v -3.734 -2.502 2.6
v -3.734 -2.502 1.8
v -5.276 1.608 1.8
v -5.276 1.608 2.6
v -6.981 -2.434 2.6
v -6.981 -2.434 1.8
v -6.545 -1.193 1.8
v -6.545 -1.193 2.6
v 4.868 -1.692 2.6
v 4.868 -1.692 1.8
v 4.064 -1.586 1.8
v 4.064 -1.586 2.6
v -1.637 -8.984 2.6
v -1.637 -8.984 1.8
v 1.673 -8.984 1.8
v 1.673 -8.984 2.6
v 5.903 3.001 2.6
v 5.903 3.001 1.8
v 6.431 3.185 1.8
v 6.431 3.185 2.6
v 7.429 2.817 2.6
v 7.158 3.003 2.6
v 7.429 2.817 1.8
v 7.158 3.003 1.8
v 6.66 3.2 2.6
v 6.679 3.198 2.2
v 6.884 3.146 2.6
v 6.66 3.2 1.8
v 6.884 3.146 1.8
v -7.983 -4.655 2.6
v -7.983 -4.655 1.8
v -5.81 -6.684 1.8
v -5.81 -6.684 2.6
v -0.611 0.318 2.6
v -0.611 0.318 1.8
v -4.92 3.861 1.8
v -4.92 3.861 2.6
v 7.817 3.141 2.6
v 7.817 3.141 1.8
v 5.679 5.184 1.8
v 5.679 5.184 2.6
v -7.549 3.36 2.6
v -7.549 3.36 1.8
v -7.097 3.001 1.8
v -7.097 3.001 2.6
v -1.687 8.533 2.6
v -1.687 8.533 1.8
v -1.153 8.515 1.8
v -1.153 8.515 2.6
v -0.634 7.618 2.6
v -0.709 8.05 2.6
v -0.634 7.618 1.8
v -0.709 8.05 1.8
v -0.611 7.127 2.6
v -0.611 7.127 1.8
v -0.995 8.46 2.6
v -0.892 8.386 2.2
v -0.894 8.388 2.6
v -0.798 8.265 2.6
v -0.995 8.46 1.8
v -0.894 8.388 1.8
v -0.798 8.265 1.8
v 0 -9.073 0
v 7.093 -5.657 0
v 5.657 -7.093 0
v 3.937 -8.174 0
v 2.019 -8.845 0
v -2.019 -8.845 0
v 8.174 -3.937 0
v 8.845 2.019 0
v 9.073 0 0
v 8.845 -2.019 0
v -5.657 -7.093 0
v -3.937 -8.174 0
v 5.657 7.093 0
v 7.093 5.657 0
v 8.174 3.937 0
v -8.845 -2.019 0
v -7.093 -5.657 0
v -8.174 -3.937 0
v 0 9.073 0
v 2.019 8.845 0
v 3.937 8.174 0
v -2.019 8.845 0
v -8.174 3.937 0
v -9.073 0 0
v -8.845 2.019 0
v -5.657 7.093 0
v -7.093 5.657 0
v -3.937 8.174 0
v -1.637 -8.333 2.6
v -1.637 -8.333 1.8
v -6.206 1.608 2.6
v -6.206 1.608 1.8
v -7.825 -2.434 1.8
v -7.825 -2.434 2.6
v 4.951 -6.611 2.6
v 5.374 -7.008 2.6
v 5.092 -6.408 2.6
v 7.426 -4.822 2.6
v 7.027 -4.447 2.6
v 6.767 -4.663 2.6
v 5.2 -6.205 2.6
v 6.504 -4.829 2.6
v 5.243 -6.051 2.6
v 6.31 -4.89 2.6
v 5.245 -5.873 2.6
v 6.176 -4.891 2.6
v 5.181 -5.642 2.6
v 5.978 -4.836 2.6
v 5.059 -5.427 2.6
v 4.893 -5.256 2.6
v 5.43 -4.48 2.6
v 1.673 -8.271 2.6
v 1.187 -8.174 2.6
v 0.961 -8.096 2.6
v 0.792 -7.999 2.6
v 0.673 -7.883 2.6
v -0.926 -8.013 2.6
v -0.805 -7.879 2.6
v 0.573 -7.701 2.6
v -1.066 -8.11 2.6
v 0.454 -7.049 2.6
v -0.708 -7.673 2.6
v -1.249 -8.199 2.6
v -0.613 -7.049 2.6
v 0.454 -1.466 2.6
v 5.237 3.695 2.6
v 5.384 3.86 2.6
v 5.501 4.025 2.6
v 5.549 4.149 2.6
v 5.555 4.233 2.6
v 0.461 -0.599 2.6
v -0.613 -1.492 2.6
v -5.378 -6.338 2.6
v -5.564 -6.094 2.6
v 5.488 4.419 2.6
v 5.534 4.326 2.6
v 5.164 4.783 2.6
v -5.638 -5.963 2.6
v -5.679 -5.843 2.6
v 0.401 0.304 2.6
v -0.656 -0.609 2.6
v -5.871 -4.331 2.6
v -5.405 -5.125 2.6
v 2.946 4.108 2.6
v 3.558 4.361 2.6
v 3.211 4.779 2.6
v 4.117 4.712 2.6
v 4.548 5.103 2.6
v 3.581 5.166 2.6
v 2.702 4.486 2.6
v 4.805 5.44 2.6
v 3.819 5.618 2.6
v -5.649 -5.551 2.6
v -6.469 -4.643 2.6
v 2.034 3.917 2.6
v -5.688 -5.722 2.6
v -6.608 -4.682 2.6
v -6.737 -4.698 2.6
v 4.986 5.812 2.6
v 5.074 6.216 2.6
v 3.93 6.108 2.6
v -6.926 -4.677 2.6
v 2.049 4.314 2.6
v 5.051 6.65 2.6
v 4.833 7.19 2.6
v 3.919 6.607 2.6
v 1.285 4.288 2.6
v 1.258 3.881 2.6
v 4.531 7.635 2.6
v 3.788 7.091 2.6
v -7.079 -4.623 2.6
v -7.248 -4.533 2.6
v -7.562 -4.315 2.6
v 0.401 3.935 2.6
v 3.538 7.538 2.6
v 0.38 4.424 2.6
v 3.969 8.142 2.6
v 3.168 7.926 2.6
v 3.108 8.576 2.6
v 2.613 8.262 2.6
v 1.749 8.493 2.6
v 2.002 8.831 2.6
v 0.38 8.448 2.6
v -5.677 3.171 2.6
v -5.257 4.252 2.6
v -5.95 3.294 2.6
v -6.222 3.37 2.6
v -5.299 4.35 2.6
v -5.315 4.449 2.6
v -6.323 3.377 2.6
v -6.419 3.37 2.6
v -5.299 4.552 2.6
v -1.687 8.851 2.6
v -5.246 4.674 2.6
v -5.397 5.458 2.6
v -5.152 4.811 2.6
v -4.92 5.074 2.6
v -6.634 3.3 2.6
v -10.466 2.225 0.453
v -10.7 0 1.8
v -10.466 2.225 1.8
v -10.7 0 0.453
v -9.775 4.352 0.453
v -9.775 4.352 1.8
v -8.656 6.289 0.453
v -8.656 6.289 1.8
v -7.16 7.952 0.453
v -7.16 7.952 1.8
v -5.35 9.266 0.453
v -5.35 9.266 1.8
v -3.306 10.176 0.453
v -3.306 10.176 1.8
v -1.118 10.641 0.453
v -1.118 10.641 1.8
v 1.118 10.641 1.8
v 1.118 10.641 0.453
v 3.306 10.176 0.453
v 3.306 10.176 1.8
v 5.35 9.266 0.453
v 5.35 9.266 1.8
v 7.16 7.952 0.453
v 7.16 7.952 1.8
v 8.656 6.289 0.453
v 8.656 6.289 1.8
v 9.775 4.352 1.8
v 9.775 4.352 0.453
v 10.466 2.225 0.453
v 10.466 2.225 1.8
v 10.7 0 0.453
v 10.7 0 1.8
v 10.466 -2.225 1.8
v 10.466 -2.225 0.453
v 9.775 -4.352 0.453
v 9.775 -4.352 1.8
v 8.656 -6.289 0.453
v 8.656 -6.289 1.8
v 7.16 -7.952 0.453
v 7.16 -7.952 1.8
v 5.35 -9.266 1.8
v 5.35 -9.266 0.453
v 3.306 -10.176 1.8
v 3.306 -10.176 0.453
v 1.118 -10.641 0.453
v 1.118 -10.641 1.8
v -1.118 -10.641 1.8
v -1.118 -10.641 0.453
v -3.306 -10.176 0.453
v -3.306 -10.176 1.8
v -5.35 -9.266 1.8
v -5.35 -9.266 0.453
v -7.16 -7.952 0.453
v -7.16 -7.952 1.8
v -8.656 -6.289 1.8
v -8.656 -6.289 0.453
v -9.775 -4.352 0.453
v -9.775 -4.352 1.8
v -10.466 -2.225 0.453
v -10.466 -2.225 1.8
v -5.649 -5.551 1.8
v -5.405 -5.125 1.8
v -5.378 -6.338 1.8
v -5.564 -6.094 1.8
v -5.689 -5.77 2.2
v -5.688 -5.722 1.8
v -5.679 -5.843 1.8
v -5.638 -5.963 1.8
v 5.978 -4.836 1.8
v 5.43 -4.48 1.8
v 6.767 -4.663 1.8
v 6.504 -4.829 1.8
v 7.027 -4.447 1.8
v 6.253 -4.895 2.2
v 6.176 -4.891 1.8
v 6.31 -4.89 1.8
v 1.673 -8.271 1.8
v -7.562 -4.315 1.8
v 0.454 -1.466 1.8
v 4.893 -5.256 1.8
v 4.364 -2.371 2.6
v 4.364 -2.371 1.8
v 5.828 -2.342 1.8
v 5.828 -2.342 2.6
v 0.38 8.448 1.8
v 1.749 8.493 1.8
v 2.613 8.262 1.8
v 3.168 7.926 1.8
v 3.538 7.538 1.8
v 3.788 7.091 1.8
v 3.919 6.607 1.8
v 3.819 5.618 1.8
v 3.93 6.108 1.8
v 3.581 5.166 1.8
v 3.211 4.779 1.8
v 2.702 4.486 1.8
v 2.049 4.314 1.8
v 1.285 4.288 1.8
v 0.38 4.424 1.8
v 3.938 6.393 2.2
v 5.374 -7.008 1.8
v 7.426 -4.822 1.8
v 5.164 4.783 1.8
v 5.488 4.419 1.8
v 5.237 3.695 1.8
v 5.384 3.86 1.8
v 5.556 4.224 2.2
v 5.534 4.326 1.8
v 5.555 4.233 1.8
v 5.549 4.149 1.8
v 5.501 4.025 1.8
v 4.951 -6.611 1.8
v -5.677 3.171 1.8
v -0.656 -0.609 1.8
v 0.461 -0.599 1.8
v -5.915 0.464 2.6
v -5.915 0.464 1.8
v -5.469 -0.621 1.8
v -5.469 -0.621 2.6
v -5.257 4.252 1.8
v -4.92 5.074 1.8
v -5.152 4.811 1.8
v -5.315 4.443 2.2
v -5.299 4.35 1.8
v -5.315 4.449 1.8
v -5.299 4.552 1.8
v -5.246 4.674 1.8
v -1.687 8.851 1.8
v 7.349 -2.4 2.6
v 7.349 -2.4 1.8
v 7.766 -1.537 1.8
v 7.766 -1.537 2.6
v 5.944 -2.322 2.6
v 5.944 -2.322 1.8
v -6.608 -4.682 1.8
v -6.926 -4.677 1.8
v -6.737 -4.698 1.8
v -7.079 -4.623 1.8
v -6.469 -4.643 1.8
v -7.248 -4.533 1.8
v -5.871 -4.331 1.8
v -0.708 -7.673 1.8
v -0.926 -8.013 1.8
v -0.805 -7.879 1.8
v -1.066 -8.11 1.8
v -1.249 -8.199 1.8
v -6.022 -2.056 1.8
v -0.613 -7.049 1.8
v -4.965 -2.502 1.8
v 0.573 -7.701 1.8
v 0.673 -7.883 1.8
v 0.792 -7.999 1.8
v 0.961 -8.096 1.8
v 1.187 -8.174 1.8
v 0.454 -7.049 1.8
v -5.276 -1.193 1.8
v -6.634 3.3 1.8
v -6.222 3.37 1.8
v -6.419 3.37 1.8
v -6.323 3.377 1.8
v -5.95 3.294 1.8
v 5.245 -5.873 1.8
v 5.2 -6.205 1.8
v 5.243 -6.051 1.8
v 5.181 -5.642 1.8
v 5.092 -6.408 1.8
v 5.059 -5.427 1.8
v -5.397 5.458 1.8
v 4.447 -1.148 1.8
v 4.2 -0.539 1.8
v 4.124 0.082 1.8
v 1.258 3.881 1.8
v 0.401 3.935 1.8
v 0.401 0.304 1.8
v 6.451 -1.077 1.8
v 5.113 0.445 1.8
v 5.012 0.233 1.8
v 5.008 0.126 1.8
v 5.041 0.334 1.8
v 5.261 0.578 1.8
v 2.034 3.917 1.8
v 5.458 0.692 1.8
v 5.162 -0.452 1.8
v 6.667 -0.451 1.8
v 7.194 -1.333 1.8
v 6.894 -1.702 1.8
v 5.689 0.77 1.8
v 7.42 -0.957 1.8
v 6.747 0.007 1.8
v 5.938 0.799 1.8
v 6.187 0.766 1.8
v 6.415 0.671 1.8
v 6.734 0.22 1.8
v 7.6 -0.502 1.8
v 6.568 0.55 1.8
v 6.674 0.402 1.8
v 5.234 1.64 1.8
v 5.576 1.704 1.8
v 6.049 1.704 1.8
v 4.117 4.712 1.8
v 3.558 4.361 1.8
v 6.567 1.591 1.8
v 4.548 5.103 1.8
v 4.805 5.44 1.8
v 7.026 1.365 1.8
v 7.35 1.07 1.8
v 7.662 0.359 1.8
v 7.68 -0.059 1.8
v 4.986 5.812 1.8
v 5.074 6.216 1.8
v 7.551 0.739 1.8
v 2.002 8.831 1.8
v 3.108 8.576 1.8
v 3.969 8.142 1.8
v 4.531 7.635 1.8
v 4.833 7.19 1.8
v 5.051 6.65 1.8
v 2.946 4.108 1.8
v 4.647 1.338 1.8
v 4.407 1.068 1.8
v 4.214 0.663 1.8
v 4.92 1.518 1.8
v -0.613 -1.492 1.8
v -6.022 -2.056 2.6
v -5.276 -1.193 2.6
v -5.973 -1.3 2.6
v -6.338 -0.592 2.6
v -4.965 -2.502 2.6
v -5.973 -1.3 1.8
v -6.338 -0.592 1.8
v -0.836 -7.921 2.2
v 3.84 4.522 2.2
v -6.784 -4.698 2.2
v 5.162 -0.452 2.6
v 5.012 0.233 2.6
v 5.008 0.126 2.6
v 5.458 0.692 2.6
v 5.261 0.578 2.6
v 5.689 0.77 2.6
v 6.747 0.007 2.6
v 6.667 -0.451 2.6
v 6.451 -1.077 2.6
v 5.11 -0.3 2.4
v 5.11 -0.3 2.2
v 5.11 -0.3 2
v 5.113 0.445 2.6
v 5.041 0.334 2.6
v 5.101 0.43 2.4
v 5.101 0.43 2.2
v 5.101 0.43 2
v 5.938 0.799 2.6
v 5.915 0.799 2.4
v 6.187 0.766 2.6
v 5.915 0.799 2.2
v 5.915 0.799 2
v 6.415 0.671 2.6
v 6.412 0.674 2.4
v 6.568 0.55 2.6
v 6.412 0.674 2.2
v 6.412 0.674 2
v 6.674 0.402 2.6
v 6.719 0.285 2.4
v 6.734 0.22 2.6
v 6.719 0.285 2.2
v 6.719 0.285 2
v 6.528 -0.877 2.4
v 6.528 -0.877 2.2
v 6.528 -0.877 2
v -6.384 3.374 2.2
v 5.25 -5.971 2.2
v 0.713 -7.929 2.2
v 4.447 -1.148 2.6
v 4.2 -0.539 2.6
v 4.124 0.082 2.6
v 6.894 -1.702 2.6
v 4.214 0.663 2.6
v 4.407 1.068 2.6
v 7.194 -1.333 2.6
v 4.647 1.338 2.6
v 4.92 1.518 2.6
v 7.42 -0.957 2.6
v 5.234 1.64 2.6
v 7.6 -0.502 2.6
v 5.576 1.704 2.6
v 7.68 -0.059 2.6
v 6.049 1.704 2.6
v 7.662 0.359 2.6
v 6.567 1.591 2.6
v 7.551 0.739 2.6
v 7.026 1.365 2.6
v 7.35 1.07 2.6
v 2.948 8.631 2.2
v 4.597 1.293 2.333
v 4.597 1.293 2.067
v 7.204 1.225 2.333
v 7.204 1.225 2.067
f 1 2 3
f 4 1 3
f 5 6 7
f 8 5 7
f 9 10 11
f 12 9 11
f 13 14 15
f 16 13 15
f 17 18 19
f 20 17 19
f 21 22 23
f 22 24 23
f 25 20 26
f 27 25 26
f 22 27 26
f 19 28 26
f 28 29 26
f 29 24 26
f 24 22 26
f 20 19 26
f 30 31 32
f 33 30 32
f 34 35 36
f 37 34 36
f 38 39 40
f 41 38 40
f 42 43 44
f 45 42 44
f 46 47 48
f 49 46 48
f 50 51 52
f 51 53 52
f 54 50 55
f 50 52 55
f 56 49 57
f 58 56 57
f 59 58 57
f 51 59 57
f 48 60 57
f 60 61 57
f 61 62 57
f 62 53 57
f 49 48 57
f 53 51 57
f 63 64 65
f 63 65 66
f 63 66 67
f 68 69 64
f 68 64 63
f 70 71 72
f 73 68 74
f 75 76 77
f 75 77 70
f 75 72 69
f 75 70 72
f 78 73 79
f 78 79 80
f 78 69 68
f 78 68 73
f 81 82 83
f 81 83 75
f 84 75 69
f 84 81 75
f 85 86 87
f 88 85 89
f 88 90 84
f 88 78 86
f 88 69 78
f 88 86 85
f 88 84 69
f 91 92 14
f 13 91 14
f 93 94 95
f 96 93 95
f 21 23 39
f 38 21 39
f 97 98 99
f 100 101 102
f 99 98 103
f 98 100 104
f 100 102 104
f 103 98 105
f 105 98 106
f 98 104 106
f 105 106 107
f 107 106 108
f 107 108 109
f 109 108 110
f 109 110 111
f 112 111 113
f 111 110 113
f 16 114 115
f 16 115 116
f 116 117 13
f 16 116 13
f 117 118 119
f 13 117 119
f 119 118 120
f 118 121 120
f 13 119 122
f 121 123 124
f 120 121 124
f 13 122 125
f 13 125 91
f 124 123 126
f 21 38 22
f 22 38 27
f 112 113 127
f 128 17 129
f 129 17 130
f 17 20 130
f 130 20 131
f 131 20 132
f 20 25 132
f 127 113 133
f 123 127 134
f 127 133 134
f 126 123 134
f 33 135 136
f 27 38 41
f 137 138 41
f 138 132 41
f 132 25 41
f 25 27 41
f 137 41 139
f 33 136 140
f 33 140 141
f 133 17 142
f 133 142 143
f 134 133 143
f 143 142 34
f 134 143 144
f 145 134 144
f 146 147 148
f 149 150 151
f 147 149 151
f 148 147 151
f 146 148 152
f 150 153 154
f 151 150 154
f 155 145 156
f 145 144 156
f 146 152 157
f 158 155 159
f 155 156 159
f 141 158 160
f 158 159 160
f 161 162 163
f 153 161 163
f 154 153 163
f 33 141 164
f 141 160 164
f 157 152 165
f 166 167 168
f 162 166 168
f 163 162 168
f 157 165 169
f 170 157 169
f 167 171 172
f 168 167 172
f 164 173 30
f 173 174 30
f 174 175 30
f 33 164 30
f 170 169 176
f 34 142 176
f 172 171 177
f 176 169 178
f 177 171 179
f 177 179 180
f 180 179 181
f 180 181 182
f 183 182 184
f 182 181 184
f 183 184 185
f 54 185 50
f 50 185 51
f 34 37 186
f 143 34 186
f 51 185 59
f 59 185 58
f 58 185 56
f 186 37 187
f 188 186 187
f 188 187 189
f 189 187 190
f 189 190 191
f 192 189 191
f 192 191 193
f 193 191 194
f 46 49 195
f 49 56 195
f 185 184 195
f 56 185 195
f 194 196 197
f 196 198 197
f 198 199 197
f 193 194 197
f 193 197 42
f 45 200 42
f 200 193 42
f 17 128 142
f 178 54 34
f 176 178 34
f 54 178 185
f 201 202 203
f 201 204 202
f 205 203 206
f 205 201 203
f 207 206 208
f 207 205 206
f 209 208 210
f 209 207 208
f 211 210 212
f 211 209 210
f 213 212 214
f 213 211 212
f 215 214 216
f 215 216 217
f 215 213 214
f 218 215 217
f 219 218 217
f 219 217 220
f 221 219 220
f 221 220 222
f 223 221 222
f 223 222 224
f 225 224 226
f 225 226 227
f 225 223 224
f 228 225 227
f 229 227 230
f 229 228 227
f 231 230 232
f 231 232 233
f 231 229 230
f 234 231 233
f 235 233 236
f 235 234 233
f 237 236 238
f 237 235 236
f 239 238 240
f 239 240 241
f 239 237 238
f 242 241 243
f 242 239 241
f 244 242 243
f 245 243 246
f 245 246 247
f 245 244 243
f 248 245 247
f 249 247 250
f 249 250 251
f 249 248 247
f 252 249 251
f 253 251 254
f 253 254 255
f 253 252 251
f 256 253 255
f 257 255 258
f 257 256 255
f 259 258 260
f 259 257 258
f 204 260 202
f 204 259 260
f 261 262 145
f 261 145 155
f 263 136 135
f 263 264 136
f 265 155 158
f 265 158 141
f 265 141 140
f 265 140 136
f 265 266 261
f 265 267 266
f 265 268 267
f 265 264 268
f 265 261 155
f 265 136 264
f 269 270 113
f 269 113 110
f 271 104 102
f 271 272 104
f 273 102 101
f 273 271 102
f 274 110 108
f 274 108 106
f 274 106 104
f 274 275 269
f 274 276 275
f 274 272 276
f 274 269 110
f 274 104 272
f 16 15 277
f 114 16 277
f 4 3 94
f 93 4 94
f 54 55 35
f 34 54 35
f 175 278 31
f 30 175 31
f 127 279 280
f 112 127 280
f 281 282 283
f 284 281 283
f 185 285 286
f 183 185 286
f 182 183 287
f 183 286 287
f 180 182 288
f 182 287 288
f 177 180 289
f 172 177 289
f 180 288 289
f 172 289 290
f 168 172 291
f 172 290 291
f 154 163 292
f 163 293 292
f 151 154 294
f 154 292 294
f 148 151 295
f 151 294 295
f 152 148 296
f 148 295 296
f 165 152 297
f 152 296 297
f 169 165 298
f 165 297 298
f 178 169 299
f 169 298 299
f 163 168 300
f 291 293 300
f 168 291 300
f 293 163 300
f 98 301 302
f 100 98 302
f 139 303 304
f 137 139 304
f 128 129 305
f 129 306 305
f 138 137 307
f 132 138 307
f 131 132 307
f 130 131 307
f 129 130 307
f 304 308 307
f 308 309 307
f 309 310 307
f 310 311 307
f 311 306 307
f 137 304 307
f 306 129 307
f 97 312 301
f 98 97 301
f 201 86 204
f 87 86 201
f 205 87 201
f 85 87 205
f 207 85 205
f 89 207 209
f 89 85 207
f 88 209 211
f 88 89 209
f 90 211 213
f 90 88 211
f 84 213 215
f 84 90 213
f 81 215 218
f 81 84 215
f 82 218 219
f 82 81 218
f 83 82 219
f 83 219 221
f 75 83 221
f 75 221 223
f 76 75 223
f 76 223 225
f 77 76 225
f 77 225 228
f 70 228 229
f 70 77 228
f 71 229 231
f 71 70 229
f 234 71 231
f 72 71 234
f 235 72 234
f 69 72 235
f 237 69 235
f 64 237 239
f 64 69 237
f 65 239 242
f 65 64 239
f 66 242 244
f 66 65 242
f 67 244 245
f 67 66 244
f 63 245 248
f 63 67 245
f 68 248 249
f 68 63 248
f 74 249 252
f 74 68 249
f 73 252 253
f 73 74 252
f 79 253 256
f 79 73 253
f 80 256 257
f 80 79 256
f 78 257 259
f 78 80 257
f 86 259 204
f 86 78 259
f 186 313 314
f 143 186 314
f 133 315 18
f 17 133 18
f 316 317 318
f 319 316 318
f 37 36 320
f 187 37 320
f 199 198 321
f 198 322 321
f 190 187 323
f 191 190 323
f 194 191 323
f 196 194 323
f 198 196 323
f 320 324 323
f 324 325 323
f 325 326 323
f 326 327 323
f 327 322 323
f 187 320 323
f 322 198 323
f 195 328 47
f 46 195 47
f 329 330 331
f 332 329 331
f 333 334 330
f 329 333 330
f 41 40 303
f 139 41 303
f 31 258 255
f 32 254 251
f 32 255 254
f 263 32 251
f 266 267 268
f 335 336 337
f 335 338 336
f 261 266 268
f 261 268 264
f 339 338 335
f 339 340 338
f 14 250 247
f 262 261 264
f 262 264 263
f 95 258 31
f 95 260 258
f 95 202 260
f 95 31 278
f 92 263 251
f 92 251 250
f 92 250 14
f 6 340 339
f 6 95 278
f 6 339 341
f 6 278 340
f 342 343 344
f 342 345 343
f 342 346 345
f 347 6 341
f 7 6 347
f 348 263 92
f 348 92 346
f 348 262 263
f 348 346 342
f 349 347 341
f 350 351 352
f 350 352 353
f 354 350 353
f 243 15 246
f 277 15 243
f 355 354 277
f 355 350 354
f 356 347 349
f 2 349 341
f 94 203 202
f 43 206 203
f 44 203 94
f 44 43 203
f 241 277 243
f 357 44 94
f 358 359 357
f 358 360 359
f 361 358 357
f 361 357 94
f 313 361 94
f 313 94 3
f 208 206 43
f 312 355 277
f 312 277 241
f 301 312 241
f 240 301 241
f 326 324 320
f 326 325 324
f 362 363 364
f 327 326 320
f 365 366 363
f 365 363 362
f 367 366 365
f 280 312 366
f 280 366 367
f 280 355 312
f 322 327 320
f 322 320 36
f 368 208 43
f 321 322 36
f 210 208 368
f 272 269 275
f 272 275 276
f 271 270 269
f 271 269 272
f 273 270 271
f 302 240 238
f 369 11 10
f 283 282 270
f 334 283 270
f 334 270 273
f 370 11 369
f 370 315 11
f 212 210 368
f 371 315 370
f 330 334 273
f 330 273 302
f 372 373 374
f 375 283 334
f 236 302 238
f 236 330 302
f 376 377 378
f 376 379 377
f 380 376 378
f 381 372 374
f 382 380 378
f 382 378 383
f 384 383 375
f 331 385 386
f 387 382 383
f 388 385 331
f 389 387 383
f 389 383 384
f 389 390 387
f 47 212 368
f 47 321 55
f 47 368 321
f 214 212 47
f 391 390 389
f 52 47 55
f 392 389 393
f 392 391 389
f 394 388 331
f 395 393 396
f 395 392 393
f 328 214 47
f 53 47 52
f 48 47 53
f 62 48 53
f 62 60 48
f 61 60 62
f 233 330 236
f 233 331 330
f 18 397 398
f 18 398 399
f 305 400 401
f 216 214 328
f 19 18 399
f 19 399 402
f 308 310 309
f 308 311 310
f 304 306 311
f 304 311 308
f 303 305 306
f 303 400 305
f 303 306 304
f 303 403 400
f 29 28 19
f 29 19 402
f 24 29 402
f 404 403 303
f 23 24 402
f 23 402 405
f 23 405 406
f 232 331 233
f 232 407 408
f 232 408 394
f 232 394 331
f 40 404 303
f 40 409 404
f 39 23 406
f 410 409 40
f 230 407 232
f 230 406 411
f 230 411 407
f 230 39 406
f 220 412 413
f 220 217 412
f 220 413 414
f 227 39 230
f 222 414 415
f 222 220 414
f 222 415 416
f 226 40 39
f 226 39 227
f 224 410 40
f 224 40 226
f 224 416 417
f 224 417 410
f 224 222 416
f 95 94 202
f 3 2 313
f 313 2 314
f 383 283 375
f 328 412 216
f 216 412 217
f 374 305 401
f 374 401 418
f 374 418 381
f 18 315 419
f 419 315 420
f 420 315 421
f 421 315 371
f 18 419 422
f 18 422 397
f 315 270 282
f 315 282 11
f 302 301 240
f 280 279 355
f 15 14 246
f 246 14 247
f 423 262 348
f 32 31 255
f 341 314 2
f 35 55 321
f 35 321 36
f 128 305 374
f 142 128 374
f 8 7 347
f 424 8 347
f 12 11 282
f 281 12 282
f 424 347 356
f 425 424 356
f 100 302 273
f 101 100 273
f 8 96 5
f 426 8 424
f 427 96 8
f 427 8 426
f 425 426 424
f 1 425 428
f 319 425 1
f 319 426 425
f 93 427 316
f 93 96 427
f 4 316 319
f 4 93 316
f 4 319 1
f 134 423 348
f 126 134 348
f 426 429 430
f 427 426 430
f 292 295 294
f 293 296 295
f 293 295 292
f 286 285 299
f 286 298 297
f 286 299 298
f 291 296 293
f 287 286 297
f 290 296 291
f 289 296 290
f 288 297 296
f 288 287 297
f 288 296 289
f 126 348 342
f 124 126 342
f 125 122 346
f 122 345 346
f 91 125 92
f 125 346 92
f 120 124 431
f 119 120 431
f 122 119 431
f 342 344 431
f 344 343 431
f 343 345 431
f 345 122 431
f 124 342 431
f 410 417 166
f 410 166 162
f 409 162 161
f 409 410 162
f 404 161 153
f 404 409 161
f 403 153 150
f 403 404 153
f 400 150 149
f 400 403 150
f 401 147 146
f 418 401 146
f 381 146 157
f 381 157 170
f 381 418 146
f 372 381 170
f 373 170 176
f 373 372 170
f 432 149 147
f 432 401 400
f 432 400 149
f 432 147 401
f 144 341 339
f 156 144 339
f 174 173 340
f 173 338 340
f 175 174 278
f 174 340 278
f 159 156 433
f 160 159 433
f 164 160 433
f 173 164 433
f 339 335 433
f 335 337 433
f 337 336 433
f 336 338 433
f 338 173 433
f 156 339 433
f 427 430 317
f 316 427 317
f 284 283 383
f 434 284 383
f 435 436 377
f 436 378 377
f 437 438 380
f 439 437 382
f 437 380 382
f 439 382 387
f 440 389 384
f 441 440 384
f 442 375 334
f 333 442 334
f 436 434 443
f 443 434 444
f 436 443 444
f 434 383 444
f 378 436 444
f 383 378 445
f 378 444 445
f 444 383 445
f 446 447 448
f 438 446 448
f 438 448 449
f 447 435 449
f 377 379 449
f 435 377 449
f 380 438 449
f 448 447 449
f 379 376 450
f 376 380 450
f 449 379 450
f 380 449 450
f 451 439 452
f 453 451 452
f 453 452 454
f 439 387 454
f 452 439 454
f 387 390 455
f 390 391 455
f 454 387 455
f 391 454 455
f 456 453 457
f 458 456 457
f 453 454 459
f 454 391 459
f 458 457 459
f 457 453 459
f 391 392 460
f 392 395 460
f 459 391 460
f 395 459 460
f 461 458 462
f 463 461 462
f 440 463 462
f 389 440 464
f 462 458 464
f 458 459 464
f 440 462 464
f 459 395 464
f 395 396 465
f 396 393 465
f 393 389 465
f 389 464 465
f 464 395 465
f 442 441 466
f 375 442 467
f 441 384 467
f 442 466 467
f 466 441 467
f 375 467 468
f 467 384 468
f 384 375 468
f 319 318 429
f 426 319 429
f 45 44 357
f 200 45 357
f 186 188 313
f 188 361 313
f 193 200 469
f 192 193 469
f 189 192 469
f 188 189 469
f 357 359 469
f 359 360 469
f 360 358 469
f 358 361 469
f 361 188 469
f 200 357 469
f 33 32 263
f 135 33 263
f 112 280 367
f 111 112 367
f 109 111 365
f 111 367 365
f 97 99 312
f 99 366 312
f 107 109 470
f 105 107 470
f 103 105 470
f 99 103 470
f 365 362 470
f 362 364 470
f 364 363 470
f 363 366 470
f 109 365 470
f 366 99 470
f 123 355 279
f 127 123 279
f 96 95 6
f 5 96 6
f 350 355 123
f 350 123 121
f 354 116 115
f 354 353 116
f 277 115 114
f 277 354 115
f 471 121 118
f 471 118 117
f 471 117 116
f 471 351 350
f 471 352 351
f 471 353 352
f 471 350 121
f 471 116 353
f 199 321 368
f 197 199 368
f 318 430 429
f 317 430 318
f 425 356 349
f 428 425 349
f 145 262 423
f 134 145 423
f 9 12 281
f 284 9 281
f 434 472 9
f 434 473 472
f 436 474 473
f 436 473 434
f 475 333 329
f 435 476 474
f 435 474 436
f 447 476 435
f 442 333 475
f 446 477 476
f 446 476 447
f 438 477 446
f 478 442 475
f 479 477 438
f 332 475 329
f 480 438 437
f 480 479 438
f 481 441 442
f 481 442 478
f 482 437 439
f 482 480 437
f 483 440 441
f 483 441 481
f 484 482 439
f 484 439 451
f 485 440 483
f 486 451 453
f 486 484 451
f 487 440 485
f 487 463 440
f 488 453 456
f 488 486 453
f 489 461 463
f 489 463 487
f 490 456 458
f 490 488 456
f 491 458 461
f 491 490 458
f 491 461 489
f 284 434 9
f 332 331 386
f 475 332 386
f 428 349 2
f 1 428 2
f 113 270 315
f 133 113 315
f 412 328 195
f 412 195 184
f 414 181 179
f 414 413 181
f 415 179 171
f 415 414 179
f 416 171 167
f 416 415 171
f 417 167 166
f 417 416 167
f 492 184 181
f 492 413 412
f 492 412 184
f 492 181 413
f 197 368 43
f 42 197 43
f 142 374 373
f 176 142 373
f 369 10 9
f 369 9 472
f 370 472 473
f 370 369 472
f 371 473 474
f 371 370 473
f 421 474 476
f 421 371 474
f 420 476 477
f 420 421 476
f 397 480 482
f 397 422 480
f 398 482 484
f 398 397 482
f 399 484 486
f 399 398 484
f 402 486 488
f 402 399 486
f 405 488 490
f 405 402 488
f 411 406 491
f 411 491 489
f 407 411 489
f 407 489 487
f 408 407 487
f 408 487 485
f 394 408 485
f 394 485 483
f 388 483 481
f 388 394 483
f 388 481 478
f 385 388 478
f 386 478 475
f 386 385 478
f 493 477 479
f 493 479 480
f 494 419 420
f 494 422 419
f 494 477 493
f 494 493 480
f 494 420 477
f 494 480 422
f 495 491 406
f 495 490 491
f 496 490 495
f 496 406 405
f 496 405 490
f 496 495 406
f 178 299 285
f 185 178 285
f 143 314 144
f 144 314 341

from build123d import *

# Parameters (mm, degrees)
F3_DEPTH = 0.8


with BuildPart() as f1:
    # F0 (on Front) → F1 (revolve)
    with BuildSketch(Plane.XZ):
        Polygon((0, 1.8), (-10.7, 1.8), (-10.7, 0.4530665231), (-9.0727129846, 0), (0, 0), align=None)
    revolve(axis=Axis((0, 0, 1.1966938619), (0, 0, -1)))

    # F2 (on face) → F3 (join)
    with BuildSketch(Plane.XY.offset(1.8)):
        with BuildLine():
            add(Edge.make_bspline(
                [(-1.6867941013, 8.8509330526), (0.8566841716, 8.8753895834), (2.649315499, 9.0611870259), (4.7208145261, 7.7993022278), (5.050977692, 6.6498457454)],
                knots=[0, 0, 0, 0, 0.5589307471, 1, 1, 1, 1], degree=3))
            Line((-1.6867941013, 8.8509330526), (-1.6867941013, 8.5329981521))
            add(Edge.make_bspline(
                [(-1.6867941013, 8.5329981521), (-1.3774677293, 8.5470557254), (-0.6938875858, 8.5771007031), (-0.6173685214, 7.6472761807), (-0.6112642586, 7.1267476305)],
                knots=[0, 0, 0, 0, 0.441787592, 1, 1, 1, 1], degree=3))
            Line((-0.6112642586, 7.1267476305), (-0.6112642586, 0.3177910403))
            Line((-0.6112642586, 0.3177910403), (-4.9199624918, 3.8612245116))
            add(Edge.make_bspline(
                [(-4.9199624918, 3.8612245116), (-5.1154879855, 4.0527227146), (-5.5120993261, 4.4411649455), (-5.1191776451, 4.8610289061), (-4.9199624918, 5.0739040598)],
                knots=[0, 0, 0, 0, 0.4929901738, 1, 1, 1, 1], degree=3))
            Line((-4.9199624918, 5.0739040598), (-5.3968969733, 5.457715597))
            Line((-5.3968969733, 5.457715597), (-7.5489841402, 3.3604586497))
            Line((-7.5489841402, 3.3604586497), (-7.0966347121, 3.000701312))
            add(Edge.make_bspline(
                [(-7.0966347121, 3.000701312), (-6.8613198471, 3.1750743352), (-6.4010215426, 3.5161645889), (-5.9145178984, 3.2846312905), (-5.6767258793, 3.1714630313)],
                knots=[0, 0, 0, 0, 0.5112225325, 1, 1, 1, 1], degree=3))
            Line((-5.6767258793, 3.1714630313), (-0.6559019093, -0.6086938665))
            Line((-0.6559019093, -0.6086938665), (-5.8705802076, -4.3306946754))
            add(Edge.make_bspline(
                [(-5.8705802076, -4.3306946754), (-6.1822484494, -4.5196679636), (-6.7864429099, -4.8860081888), (-7.308925656, -4.5013103723), (-7.5618904084, -4.3150554411)],
                knots=[0, 0, 0, 0, 0.5158409455, 1, 1, 1, 1], degree=3))
            Line((-7.5618904084, -4.3150554411), (-7.9826125875, -4.6550915577))
            Line((-7.9826125875, -4.6550915577), (-5.8098412119, -6.6837798804))
            Line((-5.8098412119, -6.6837798804), (-5.3775920533, -6.3379807398))
            add(Edge.make_bspline(
                [(-5.4053300992, -5.1254965365), (-5.5515290524, -5.3446676224), (-5.8379925252, -5.7741133125), (-5.5289246402, -6.1526388002), (-5.3775920533, -6.3379807398)],
                knots=[0, 0, 0, 0, 0.5103580985, 1, 1, 1, 1], degree=3))
            Line((-5.4053300992, -5.1254965365), (-0.6126278895, -1.4923192712))
            Line((-0.6126278895, -1.4923192712), (-0.6126278895, -7.048912812))
            add(Edge.make_bspline(
                [(-0.6126278895, -7.048912812), (-0.6389726569, -7.377813444), (-0.6916788554, -8.0358227462), (-1.3219282839, -8.234017122), (-1.637152629, -8.3331456408)],
                knots=[0, 0, 0, 0, 0.4998419184, 1, 1, 1, 1], degree=3))
            Line((-1.637152629, -8.3331456408), (-1.637152629, -8.9842546731))
            Line((-1.637152629, -8.9842546731), (1.6732236836, -8.9842546731))
            Line((1.6732236836, -8.9842546731), (1.6732236836, -8.2714613527))
            add(Edge.make_bspline(
                [(0.4535702465, -7.048912812), (0.4870410433, -7.3872676951), (0.5558033707, -8.0823831835), (1.2942327078, -8.2073324667), (1.6732236836, -8.2714613527)],
                knots=[0, 0, 0, 0, 0.4867606733, 1, 1, 1, 1], degree=3))
            Line((0.4535702465, -7.048912812), (0.4535702465, -1.4659117442))
            Line((0.4535702465, -1.4659117442), (4.8928316683, -5.2557615563))
            add(Edge.make_bspline(
                [(4.8928316683, -5.2557615563), (5.103411153, -5.4165492766), (5.3978362889, -6.0029897915), (5.1020476496, -6.4001318691), (4.9510909234, -6.6109133504)],
                knots=[0, 0, 0, 0, 0.5154207237, 1, 1, 1, 1], degree=3))
            Line((4.9510909234, -6.6109133504), (5.3739010935, -7.0078365295))
            Line((5.3739010935, -7.0078365295), (7.4263224378, -4.8215580173))
            Line((7.4263224378, -4.8215580173), (7.0269443095, -4.4466322288))
            add(Edge.make_bspline(
                [(5.4299915209, -4.4800881296), (5.7073067114, -4.6913712485), (6.2579025081, -5.1108635847), (6.7718523941, -4.6669584172), (7.0269443095, -4.4466322288)],
                knots=[0, 0, 0, 0, 0.5036638351, 1, 1, 1, 1], degree=3))
            Line((5.4299915209, -4.4800881296), (0.4608821182, -0.5992884981))
            Line((0.4608821182, -0.5992884981), (5.9025837108, 3.000701312))
            add(Edge.make_bspline(
                [(5.9025837108, 3.000701312), (6.1652393352, 3.1131659914), (6.6968427958, 3.3407895685), (7.1827875665, 2.993159634), (7.4286358431, 2.8172873426)],
                knots=[0, 0, 0, 0, 0.4940818558, 1, 1, 1, 1], degree=3))
            Line((7.4286358431, 2.8172873426), (7.8171929345, 3.1411375385))
            Line((7.8171929345, 3.1411375385), (5.6788134389, 5.183564499))
            Line((5.6788134389, 5.183564499), (5.1636509597, 4.7825793736))
            add(Edge.make_bspline(
                [(5.1636509597, 4.7825793736), (5.3563745653, 4.5959784132), (5.7323232052, 4.2319733033), (5.3994815796, 3.8708627719), (5.23726549, 3.6948693451)],
                knots=[0, 0, 0, 0, 0.5126328046, 1, 1, 1, 1], degree=3))
            Line((5.23726549, 3.6948693451), (0.4013032594, 0.3040304291))
            Line((0.4013032594, 0.3040304291), (0.4013032594, 3.9351717569))
            add(Edge.make_bspline(
                [(5.050977692, 6.6498457454), (5.2227766775, 5.7417653934), (3.8530424976, 4.1063453678), (1.8400062355, 3.7766705272), (0.4013032594, 3.9351717569)],
                knots=[0, 0, 0, 0, 0.4558296962, 1, 1, 1, 1], degree=3))
        make_face()
        with BuildLine():
            Line((0.3797819663, 4.424153241), (0.3797819663, 8.4475489607))
            add(Edge.make_bspline(
                [(0.3797819663, 8.4475489607), (2.7214622988, 8.8398724894), (5.0507446574, 6.4596899692), (2.9288335052, 3.8387254341), (0.3797819663, 4.424153241)],
                knots=[0, 0, 0, 0, 0.5012880833, 1, 1, 1, 1], degree=3))
        make_face(mode=Mode.SUBTRACT)
        Polygon((-6.2060756609, 1.6079591587), (-7.8247580677, -2.4339009542), (-6.9814925082, -2.4339009542), (-6.5453206189, -1.1932341149), (-6.0219140723, -2.0558852702), (-5.2755754441, -1.1932341149), (-4.9654087052, -2.5017498992), (-3.7344344892, -2.5017498992), (-5.2755754441, 1.6079591587), align=None)
        Polygon((-6.3382112782, -0.5918067245), (-5.9152944013, 0.4642193671), (-5.4694297723, -0.6213641609), (-5.9734508395, -1.2998539023), align=None, mode=Mode.SUBTRACT)
        with BuildLine():
            Line((4.3641445227, -2.3708629888), (5.8277440257, -2.3417847697))
            add(Edge.make_bspline(
                [(5.8277440257, -2.3417847697), (5.1487722105, -0.2610644891), (4.6605925288, 0.2992301122), (5.9169845073, 0.9749441024), (7.2274061463, 0.3335519894), (6.3030754531, -1.3617813756), (5.9440564364, -2.3223995231)],
                knots=[0, 0, 0, 0, 0.3215656024, 0.5011300693, 0.686712218, 1, 1, 1, 1], degree=3))
            Line((5.9440564364, -2.3223995231), (7.3494995013, -2.3999412078))
            Line((7.3494995013, -2.3999412078), (7.7662859112, -1.5372899361))
            Line((7.7662859112, -1.5372899361), (6.8939416669, -1.7020660453))
            add(Edge.make_bspline(
                [(4.8681655899, -1.6923733056), (3.9570508525, -0.8103366708), (3.8497648676, 1.987677069), (7.9298202319, 1.7446883295), (7.8729055822, -0.6455606199), (6.8939416669, -1.7020660453)],
                knots=[0, 0, 0, 0, 0.3420298118, 0.6610694697, 1, 1, 1, 1], degree=3))
            Line((4.8681655899, -1.6923733056), (4.0636705235, -1.5857535182))
            Line((4.0636705235, -1.5857535182), (4.3641445227, -2.3708629888))
        make_face()
    extrude(amount=F3_DEPTH)


solid = f1.part
